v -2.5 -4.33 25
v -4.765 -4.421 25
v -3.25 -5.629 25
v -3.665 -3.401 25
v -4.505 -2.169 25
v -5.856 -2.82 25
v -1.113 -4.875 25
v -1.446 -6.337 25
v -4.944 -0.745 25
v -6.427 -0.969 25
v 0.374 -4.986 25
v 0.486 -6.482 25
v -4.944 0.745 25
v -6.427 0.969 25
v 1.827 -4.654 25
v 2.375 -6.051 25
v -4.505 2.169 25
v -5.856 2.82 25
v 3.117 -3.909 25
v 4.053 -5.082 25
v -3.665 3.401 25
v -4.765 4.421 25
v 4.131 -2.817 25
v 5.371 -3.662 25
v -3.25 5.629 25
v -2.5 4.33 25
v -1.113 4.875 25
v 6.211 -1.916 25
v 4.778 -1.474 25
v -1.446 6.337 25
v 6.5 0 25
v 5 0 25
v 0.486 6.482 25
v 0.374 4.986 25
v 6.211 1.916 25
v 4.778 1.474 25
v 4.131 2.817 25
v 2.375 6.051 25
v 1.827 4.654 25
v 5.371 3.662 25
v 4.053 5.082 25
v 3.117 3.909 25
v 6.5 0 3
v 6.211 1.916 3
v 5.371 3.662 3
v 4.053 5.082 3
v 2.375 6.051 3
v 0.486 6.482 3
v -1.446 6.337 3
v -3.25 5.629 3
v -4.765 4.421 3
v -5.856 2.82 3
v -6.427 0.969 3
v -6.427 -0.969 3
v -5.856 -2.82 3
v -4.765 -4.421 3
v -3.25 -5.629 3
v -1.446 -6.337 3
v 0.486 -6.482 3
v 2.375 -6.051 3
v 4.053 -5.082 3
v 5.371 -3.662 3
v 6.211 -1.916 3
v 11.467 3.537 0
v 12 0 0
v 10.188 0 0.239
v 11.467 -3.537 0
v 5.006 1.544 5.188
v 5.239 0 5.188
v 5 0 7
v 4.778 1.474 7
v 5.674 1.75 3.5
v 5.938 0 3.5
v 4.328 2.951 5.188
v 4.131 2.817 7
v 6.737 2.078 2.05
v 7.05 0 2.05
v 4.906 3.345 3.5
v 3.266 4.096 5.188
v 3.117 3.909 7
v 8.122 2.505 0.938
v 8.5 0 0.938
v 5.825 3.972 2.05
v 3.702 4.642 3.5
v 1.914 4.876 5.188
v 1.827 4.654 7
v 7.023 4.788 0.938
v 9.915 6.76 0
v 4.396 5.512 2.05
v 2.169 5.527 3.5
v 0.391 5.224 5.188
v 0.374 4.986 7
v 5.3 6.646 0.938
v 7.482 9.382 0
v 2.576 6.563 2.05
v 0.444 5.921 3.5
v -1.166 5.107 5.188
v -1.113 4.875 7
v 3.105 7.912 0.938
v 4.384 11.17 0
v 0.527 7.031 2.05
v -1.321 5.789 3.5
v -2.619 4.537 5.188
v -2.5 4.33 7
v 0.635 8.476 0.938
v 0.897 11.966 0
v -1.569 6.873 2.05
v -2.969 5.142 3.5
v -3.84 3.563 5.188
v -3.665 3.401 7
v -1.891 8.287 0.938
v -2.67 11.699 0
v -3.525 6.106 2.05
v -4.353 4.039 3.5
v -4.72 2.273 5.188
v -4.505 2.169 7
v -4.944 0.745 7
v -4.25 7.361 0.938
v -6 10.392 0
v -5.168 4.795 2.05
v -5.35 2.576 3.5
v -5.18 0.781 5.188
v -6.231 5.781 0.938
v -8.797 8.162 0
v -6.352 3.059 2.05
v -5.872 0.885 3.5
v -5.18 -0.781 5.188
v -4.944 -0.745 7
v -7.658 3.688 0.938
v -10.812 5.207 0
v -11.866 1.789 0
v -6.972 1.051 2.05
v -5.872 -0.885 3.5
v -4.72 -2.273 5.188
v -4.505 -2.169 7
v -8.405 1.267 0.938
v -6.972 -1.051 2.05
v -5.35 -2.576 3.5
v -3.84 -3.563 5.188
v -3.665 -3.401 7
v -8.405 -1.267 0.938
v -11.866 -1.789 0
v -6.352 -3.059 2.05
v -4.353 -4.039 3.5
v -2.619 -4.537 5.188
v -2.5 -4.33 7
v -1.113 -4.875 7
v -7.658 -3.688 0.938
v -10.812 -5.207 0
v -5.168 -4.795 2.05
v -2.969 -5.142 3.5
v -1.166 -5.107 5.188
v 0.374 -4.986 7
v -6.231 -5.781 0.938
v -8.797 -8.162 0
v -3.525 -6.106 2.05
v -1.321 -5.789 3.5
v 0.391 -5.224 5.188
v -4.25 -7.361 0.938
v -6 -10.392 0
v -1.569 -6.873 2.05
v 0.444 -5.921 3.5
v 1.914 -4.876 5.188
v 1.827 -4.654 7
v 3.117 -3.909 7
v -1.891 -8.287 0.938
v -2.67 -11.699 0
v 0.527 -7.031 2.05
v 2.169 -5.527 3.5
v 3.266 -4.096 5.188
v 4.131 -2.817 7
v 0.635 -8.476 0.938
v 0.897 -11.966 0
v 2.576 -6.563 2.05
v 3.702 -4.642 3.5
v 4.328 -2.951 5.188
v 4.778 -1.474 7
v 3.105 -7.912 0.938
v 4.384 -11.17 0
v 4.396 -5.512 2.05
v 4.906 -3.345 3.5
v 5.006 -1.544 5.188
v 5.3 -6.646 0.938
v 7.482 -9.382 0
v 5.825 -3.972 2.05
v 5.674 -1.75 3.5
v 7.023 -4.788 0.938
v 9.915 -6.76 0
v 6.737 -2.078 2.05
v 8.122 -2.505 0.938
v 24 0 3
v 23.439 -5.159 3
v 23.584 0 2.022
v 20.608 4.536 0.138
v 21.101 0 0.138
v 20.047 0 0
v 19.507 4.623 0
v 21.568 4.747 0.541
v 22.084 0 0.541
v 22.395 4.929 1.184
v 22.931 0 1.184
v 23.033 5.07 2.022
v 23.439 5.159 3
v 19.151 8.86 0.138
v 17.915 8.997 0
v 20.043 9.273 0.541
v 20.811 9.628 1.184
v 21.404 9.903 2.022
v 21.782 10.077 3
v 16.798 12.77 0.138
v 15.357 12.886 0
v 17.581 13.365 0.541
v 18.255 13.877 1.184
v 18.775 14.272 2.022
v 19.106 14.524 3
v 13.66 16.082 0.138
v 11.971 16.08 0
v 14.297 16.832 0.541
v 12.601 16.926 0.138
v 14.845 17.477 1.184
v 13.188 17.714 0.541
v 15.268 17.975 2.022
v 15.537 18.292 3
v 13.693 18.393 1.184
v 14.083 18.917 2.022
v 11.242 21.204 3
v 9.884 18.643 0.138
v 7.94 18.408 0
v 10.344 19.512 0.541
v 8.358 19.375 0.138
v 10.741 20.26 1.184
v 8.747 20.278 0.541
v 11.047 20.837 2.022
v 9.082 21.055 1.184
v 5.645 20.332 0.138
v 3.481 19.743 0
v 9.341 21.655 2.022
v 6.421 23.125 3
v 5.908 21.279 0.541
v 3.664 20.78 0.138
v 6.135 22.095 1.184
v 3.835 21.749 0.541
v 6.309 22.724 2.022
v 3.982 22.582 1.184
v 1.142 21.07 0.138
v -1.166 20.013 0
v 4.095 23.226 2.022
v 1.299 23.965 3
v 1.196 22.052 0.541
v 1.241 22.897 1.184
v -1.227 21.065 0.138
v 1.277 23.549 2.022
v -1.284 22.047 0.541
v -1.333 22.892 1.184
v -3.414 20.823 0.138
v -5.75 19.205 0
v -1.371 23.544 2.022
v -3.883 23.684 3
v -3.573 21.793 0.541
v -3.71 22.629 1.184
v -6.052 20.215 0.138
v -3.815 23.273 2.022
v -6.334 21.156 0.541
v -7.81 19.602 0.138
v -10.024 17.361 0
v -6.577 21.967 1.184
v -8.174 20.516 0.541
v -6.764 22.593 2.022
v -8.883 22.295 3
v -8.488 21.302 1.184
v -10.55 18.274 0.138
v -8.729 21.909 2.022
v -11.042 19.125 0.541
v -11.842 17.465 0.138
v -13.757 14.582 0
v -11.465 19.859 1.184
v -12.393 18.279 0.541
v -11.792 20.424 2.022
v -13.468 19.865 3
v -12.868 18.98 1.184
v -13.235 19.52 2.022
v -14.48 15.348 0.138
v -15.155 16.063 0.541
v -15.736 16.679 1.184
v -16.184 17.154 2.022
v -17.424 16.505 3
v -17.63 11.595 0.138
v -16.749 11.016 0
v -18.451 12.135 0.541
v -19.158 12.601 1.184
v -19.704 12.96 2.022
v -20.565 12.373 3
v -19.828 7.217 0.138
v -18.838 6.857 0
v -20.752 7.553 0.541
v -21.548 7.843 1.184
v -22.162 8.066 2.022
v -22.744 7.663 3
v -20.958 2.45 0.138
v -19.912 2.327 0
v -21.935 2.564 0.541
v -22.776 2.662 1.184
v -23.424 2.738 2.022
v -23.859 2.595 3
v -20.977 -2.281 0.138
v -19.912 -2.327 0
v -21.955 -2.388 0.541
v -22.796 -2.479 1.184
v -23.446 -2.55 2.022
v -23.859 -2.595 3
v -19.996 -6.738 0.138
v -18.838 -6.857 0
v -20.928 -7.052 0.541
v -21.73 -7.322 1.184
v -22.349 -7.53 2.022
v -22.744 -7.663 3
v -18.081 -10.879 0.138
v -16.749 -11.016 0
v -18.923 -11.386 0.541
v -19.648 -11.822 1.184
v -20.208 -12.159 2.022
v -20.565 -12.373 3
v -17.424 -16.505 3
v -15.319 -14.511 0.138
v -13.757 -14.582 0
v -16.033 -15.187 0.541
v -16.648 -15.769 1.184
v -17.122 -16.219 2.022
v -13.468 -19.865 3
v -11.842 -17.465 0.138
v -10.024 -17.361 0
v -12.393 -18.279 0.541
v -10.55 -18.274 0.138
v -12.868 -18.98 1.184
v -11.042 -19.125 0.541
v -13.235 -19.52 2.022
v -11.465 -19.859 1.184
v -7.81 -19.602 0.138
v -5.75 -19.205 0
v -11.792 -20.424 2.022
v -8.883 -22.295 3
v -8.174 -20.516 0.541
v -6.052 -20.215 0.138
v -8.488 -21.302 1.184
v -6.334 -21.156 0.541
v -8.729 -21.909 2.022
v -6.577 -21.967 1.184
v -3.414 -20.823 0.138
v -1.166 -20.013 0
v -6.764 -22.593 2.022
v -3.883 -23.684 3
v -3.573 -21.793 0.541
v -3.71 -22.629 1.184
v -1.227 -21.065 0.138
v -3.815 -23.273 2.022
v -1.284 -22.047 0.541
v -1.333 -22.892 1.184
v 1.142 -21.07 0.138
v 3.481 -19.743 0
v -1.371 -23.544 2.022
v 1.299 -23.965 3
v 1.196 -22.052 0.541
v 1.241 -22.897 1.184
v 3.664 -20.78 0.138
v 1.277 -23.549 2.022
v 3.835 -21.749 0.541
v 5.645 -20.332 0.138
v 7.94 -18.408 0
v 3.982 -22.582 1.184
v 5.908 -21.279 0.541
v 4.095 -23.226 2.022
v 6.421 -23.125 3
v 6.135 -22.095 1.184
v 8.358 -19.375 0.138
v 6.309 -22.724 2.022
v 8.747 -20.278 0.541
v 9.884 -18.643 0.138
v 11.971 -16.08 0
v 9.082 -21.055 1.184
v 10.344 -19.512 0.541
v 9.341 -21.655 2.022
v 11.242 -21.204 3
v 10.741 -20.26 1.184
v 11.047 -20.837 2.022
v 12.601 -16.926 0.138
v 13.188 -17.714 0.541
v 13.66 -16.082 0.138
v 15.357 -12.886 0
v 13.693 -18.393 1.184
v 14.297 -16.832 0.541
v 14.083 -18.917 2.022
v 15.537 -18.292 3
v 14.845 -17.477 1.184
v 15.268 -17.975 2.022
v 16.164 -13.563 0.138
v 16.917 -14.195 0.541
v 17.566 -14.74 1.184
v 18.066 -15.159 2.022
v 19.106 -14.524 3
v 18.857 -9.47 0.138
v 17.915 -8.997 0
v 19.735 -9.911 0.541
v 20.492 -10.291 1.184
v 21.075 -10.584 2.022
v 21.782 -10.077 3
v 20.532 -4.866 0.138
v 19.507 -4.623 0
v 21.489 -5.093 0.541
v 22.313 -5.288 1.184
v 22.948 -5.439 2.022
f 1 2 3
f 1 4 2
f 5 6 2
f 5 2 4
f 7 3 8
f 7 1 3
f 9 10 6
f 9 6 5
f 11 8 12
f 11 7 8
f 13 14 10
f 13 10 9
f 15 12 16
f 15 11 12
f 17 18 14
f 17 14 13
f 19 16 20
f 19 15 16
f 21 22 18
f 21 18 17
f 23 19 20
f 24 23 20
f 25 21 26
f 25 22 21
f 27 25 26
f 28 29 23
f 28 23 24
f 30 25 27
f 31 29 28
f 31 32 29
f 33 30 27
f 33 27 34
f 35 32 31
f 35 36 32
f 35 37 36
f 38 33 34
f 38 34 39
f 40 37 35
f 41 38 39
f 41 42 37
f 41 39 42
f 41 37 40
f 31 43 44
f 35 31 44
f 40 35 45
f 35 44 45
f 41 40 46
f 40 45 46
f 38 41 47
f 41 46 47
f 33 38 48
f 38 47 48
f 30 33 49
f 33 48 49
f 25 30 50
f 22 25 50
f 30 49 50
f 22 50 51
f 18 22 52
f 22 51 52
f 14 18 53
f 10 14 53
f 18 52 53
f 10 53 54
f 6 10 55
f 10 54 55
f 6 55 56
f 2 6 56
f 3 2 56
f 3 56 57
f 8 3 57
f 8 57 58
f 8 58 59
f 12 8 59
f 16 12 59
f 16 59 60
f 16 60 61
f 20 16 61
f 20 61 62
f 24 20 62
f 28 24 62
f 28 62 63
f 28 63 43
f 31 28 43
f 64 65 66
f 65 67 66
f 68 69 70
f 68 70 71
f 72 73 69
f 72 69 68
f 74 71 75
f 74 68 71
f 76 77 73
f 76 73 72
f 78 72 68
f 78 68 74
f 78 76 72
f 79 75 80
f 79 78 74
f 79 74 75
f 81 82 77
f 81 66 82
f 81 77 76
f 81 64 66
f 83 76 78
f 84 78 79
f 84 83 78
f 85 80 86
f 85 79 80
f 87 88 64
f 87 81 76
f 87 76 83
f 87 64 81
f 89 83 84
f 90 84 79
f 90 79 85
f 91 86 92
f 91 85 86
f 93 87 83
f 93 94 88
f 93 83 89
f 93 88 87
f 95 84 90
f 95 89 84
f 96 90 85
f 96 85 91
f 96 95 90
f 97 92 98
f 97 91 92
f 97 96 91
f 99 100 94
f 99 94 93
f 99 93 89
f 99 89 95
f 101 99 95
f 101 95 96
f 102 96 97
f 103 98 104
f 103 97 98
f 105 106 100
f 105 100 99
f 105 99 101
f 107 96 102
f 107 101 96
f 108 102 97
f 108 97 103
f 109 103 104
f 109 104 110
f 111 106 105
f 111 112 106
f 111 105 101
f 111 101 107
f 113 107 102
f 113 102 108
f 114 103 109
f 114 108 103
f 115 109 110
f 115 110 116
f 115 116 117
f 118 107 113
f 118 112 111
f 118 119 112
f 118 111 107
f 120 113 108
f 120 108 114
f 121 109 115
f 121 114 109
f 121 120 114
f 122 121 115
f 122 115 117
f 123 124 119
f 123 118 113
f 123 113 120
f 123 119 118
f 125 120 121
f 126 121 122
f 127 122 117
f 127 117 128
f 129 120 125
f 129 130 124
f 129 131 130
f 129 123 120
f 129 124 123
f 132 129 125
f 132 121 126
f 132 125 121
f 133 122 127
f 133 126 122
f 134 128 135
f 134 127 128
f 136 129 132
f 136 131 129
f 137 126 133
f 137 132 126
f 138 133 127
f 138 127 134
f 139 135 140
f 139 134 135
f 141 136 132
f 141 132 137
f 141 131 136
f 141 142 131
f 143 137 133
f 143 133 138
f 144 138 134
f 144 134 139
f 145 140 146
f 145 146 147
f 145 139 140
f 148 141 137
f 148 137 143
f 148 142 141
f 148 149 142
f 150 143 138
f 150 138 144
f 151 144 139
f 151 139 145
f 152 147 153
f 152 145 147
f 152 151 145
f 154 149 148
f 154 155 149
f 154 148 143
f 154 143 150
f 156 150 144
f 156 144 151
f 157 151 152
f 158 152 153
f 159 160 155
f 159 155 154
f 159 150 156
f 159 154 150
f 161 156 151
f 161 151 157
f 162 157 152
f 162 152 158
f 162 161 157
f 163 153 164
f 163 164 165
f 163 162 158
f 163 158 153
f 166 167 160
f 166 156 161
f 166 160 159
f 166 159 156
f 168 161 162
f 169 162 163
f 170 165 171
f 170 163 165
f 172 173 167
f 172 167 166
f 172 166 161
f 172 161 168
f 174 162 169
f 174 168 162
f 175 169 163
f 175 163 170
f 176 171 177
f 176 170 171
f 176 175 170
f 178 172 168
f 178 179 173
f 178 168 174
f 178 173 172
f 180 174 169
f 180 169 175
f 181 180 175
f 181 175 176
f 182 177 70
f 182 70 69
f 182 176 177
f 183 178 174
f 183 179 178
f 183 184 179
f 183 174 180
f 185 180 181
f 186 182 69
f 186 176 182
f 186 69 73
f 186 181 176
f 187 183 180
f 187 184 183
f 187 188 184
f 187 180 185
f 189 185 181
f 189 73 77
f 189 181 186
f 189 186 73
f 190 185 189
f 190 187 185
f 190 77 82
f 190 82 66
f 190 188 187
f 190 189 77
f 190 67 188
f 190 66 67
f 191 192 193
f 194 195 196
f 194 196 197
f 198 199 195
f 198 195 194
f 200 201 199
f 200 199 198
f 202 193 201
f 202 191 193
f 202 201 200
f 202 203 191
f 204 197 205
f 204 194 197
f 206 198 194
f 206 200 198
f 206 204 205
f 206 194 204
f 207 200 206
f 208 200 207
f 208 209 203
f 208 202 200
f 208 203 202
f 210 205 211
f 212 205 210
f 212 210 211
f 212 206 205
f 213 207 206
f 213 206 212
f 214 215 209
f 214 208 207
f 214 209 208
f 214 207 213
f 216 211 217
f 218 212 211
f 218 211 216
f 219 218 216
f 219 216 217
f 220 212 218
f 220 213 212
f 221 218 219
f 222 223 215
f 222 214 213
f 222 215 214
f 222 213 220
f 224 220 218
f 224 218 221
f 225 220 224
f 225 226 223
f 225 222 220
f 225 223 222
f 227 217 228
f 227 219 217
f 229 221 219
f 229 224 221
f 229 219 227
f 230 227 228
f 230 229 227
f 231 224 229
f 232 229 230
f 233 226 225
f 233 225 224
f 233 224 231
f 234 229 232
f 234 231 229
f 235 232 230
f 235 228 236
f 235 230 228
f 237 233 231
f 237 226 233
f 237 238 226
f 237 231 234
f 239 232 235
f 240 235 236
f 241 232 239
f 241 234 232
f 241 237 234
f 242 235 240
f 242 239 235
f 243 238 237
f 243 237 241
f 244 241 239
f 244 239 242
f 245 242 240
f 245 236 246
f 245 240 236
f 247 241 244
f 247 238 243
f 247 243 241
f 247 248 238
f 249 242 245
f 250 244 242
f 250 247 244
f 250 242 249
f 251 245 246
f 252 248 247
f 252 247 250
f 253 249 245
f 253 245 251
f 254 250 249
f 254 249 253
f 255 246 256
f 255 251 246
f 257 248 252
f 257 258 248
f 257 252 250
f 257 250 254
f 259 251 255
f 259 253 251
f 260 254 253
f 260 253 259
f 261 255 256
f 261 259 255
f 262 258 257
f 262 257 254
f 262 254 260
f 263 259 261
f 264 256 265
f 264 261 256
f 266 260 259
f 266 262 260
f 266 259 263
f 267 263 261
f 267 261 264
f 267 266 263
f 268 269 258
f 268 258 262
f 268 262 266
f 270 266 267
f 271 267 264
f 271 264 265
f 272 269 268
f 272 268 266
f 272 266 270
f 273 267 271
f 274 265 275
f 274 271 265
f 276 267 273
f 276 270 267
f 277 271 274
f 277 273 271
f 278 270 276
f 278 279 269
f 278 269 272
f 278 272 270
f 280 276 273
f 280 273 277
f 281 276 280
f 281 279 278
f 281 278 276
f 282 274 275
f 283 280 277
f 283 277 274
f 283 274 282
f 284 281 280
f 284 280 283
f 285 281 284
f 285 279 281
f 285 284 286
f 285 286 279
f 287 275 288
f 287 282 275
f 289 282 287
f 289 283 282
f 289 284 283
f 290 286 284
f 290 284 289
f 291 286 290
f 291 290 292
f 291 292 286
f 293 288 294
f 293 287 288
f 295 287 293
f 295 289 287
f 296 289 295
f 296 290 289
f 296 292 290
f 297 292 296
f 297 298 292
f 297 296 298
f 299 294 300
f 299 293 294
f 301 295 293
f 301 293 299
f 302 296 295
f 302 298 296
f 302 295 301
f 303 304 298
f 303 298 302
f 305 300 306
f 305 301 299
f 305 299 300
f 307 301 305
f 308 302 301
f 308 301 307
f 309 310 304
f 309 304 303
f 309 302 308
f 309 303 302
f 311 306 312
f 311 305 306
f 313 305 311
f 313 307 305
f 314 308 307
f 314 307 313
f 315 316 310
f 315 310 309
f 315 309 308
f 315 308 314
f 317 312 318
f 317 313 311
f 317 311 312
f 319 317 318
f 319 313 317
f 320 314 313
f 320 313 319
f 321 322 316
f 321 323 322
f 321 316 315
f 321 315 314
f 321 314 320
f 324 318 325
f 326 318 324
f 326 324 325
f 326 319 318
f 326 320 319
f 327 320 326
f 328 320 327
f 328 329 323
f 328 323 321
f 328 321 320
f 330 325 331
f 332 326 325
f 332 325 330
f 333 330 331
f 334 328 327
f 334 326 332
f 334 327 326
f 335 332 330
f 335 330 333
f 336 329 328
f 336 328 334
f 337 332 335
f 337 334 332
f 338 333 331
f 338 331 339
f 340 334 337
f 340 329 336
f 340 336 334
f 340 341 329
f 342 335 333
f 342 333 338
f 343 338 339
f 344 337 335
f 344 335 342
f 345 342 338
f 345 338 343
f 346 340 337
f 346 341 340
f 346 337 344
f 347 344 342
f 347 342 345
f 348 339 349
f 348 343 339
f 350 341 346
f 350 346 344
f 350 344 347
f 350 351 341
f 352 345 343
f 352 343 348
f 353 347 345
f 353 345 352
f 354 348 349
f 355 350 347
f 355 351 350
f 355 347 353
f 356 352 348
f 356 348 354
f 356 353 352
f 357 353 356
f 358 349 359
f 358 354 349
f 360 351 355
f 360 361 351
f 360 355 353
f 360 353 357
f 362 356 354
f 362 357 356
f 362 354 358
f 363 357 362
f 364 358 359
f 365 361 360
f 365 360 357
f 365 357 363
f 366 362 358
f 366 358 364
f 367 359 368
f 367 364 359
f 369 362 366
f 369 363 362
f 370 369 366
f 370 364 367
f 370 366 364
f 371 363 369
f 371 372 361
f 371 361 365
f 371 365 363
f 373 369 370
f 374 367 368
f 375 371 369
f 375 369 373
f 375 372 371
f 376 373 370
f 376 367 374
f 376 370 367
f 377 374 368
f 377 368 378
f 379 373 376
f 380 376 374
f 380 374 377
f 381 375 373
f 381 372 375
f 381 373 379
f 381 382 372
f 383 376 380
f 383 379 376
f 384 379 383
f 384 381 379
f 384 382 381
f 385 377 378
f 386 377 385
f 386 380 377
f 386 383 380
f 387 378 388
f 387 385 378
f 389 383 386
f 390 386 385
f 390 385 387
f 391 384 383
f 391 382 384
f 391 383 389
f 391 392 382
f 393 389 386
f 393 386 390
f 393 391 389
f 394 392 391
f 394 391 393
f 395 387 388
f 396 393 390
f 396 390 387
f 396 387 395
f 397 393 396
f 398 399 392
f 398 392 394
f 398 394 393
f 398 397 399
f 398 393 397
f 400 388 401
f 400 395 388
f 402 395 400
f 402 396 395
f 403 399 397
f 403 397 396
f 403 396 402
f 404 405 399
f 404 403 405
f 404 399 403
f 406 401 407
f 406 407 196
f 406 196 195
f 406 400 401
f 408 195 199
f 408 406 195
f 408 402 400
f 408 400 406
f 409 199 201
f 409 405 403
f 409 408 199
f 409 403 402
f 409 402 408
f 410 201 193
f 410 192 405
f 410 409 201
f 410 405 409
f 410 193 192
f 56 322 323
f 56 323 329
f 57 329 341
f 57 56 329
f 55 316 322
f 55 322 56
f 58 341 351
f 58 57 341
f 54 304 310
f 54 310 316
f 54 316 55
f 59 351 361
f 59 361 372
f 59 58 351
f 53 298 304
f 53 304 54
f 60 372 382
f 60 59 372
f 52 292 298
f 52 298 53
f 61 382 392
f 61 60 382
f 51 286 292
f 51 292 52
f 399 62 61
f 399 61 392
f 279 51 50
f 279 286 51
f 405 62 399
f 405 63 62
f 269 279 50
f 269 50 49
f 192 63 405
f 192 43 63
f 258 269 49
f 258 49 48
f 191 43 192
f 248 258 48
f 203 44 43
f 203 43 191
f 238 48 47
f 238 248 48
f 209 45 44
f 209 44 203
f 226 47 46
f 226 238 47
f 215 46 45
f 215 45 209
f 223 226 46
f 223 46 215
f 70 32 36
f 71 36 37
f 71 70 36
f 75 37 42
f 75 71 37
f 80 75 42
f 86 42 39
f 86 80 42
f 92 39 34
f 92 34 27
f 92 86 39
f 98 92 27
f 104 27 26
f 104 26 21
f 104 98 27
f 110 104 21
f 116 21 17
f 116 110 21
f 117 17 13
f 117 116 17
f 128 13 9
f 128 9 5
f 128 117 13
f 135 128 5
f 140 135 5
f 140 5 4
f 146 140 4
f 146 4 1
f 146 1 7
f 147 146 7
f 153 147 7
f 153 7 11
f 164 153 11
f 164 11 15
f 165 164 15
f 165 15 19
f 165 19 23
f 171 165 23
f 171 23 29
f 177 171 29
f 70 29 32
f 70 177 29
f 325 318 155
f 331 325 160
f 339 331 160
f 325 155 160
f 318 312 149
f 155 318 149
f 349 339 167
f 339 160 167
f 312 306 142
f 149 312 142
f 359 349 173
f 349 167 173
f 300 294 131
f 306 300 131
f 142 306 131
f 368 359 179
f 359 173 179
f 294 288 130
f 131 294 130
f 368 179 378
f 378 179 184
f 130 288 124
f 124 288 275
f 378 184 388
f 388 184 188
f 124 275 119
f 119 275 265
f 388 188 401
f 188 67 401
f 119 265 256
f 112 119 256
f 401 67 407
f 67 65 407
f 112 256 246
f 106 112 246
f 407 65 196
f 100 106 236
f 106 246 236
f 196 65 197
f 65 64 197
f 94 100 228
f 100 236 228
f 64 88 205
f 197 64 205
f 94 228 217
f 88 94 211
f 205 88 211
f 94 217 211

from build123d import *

# Parameters (mm, degrees)
F0_R     = 24
F0_R_2   = 6.5
F1_DEPTH = 3
F0_R_3   = 5
F2_DEPTH = 25
F3_R     = 7


# Not quite as in the source:
# - a fillet or chamfer that OpenCascade refuses, or shapes differently, is made with other operations: its cross-section is extruded or revolved along the edge and cut away or added


with BuildPart() as f1:
    # F0 (on Top) → F1 (new body)
    with BuildSketch(Plane.XY):
        Circle(F0_R)
        Circle(F0_R_2, mode=Mode.SUBTRACT)
    extrude(amount=F1_DEPTH)

    # F0 (on Top) → F2 (join)
    with BuildSketch(Plane.XY):
        Circle(F0_R_2)
        Circle(F0_R_3, mode=Mode.SUBTRACT)
    extrude(amount=F2_DEPTH)

    # F3
    f3_edges = [f1.edges().sort_by_distance(p)[0] for p in [
        (-5, 0, 0),
    ]]
    fillet(f3_edges, radius=F3_R)

    # F4: fillet of radius 4.104163056 on 1 edges, made by hand

    # F4_s1 → F4_t2 (revolve, cut)
    with BuildSketch(Plane.XZ):
        with BuildLine():
            ThreePointArc((20.0471556651, 0), (22.5283337288, 0.8349261716), (24, 3))
            Line((24, 3), (24, 0))
            Line((24, 0), (20.0471556651, 0))
        make_face()
    revolve(axis=Axis((0, 0, 0), (0, 0, 1)), mode=Mode.SUBTRACT)


solid = f1.part
